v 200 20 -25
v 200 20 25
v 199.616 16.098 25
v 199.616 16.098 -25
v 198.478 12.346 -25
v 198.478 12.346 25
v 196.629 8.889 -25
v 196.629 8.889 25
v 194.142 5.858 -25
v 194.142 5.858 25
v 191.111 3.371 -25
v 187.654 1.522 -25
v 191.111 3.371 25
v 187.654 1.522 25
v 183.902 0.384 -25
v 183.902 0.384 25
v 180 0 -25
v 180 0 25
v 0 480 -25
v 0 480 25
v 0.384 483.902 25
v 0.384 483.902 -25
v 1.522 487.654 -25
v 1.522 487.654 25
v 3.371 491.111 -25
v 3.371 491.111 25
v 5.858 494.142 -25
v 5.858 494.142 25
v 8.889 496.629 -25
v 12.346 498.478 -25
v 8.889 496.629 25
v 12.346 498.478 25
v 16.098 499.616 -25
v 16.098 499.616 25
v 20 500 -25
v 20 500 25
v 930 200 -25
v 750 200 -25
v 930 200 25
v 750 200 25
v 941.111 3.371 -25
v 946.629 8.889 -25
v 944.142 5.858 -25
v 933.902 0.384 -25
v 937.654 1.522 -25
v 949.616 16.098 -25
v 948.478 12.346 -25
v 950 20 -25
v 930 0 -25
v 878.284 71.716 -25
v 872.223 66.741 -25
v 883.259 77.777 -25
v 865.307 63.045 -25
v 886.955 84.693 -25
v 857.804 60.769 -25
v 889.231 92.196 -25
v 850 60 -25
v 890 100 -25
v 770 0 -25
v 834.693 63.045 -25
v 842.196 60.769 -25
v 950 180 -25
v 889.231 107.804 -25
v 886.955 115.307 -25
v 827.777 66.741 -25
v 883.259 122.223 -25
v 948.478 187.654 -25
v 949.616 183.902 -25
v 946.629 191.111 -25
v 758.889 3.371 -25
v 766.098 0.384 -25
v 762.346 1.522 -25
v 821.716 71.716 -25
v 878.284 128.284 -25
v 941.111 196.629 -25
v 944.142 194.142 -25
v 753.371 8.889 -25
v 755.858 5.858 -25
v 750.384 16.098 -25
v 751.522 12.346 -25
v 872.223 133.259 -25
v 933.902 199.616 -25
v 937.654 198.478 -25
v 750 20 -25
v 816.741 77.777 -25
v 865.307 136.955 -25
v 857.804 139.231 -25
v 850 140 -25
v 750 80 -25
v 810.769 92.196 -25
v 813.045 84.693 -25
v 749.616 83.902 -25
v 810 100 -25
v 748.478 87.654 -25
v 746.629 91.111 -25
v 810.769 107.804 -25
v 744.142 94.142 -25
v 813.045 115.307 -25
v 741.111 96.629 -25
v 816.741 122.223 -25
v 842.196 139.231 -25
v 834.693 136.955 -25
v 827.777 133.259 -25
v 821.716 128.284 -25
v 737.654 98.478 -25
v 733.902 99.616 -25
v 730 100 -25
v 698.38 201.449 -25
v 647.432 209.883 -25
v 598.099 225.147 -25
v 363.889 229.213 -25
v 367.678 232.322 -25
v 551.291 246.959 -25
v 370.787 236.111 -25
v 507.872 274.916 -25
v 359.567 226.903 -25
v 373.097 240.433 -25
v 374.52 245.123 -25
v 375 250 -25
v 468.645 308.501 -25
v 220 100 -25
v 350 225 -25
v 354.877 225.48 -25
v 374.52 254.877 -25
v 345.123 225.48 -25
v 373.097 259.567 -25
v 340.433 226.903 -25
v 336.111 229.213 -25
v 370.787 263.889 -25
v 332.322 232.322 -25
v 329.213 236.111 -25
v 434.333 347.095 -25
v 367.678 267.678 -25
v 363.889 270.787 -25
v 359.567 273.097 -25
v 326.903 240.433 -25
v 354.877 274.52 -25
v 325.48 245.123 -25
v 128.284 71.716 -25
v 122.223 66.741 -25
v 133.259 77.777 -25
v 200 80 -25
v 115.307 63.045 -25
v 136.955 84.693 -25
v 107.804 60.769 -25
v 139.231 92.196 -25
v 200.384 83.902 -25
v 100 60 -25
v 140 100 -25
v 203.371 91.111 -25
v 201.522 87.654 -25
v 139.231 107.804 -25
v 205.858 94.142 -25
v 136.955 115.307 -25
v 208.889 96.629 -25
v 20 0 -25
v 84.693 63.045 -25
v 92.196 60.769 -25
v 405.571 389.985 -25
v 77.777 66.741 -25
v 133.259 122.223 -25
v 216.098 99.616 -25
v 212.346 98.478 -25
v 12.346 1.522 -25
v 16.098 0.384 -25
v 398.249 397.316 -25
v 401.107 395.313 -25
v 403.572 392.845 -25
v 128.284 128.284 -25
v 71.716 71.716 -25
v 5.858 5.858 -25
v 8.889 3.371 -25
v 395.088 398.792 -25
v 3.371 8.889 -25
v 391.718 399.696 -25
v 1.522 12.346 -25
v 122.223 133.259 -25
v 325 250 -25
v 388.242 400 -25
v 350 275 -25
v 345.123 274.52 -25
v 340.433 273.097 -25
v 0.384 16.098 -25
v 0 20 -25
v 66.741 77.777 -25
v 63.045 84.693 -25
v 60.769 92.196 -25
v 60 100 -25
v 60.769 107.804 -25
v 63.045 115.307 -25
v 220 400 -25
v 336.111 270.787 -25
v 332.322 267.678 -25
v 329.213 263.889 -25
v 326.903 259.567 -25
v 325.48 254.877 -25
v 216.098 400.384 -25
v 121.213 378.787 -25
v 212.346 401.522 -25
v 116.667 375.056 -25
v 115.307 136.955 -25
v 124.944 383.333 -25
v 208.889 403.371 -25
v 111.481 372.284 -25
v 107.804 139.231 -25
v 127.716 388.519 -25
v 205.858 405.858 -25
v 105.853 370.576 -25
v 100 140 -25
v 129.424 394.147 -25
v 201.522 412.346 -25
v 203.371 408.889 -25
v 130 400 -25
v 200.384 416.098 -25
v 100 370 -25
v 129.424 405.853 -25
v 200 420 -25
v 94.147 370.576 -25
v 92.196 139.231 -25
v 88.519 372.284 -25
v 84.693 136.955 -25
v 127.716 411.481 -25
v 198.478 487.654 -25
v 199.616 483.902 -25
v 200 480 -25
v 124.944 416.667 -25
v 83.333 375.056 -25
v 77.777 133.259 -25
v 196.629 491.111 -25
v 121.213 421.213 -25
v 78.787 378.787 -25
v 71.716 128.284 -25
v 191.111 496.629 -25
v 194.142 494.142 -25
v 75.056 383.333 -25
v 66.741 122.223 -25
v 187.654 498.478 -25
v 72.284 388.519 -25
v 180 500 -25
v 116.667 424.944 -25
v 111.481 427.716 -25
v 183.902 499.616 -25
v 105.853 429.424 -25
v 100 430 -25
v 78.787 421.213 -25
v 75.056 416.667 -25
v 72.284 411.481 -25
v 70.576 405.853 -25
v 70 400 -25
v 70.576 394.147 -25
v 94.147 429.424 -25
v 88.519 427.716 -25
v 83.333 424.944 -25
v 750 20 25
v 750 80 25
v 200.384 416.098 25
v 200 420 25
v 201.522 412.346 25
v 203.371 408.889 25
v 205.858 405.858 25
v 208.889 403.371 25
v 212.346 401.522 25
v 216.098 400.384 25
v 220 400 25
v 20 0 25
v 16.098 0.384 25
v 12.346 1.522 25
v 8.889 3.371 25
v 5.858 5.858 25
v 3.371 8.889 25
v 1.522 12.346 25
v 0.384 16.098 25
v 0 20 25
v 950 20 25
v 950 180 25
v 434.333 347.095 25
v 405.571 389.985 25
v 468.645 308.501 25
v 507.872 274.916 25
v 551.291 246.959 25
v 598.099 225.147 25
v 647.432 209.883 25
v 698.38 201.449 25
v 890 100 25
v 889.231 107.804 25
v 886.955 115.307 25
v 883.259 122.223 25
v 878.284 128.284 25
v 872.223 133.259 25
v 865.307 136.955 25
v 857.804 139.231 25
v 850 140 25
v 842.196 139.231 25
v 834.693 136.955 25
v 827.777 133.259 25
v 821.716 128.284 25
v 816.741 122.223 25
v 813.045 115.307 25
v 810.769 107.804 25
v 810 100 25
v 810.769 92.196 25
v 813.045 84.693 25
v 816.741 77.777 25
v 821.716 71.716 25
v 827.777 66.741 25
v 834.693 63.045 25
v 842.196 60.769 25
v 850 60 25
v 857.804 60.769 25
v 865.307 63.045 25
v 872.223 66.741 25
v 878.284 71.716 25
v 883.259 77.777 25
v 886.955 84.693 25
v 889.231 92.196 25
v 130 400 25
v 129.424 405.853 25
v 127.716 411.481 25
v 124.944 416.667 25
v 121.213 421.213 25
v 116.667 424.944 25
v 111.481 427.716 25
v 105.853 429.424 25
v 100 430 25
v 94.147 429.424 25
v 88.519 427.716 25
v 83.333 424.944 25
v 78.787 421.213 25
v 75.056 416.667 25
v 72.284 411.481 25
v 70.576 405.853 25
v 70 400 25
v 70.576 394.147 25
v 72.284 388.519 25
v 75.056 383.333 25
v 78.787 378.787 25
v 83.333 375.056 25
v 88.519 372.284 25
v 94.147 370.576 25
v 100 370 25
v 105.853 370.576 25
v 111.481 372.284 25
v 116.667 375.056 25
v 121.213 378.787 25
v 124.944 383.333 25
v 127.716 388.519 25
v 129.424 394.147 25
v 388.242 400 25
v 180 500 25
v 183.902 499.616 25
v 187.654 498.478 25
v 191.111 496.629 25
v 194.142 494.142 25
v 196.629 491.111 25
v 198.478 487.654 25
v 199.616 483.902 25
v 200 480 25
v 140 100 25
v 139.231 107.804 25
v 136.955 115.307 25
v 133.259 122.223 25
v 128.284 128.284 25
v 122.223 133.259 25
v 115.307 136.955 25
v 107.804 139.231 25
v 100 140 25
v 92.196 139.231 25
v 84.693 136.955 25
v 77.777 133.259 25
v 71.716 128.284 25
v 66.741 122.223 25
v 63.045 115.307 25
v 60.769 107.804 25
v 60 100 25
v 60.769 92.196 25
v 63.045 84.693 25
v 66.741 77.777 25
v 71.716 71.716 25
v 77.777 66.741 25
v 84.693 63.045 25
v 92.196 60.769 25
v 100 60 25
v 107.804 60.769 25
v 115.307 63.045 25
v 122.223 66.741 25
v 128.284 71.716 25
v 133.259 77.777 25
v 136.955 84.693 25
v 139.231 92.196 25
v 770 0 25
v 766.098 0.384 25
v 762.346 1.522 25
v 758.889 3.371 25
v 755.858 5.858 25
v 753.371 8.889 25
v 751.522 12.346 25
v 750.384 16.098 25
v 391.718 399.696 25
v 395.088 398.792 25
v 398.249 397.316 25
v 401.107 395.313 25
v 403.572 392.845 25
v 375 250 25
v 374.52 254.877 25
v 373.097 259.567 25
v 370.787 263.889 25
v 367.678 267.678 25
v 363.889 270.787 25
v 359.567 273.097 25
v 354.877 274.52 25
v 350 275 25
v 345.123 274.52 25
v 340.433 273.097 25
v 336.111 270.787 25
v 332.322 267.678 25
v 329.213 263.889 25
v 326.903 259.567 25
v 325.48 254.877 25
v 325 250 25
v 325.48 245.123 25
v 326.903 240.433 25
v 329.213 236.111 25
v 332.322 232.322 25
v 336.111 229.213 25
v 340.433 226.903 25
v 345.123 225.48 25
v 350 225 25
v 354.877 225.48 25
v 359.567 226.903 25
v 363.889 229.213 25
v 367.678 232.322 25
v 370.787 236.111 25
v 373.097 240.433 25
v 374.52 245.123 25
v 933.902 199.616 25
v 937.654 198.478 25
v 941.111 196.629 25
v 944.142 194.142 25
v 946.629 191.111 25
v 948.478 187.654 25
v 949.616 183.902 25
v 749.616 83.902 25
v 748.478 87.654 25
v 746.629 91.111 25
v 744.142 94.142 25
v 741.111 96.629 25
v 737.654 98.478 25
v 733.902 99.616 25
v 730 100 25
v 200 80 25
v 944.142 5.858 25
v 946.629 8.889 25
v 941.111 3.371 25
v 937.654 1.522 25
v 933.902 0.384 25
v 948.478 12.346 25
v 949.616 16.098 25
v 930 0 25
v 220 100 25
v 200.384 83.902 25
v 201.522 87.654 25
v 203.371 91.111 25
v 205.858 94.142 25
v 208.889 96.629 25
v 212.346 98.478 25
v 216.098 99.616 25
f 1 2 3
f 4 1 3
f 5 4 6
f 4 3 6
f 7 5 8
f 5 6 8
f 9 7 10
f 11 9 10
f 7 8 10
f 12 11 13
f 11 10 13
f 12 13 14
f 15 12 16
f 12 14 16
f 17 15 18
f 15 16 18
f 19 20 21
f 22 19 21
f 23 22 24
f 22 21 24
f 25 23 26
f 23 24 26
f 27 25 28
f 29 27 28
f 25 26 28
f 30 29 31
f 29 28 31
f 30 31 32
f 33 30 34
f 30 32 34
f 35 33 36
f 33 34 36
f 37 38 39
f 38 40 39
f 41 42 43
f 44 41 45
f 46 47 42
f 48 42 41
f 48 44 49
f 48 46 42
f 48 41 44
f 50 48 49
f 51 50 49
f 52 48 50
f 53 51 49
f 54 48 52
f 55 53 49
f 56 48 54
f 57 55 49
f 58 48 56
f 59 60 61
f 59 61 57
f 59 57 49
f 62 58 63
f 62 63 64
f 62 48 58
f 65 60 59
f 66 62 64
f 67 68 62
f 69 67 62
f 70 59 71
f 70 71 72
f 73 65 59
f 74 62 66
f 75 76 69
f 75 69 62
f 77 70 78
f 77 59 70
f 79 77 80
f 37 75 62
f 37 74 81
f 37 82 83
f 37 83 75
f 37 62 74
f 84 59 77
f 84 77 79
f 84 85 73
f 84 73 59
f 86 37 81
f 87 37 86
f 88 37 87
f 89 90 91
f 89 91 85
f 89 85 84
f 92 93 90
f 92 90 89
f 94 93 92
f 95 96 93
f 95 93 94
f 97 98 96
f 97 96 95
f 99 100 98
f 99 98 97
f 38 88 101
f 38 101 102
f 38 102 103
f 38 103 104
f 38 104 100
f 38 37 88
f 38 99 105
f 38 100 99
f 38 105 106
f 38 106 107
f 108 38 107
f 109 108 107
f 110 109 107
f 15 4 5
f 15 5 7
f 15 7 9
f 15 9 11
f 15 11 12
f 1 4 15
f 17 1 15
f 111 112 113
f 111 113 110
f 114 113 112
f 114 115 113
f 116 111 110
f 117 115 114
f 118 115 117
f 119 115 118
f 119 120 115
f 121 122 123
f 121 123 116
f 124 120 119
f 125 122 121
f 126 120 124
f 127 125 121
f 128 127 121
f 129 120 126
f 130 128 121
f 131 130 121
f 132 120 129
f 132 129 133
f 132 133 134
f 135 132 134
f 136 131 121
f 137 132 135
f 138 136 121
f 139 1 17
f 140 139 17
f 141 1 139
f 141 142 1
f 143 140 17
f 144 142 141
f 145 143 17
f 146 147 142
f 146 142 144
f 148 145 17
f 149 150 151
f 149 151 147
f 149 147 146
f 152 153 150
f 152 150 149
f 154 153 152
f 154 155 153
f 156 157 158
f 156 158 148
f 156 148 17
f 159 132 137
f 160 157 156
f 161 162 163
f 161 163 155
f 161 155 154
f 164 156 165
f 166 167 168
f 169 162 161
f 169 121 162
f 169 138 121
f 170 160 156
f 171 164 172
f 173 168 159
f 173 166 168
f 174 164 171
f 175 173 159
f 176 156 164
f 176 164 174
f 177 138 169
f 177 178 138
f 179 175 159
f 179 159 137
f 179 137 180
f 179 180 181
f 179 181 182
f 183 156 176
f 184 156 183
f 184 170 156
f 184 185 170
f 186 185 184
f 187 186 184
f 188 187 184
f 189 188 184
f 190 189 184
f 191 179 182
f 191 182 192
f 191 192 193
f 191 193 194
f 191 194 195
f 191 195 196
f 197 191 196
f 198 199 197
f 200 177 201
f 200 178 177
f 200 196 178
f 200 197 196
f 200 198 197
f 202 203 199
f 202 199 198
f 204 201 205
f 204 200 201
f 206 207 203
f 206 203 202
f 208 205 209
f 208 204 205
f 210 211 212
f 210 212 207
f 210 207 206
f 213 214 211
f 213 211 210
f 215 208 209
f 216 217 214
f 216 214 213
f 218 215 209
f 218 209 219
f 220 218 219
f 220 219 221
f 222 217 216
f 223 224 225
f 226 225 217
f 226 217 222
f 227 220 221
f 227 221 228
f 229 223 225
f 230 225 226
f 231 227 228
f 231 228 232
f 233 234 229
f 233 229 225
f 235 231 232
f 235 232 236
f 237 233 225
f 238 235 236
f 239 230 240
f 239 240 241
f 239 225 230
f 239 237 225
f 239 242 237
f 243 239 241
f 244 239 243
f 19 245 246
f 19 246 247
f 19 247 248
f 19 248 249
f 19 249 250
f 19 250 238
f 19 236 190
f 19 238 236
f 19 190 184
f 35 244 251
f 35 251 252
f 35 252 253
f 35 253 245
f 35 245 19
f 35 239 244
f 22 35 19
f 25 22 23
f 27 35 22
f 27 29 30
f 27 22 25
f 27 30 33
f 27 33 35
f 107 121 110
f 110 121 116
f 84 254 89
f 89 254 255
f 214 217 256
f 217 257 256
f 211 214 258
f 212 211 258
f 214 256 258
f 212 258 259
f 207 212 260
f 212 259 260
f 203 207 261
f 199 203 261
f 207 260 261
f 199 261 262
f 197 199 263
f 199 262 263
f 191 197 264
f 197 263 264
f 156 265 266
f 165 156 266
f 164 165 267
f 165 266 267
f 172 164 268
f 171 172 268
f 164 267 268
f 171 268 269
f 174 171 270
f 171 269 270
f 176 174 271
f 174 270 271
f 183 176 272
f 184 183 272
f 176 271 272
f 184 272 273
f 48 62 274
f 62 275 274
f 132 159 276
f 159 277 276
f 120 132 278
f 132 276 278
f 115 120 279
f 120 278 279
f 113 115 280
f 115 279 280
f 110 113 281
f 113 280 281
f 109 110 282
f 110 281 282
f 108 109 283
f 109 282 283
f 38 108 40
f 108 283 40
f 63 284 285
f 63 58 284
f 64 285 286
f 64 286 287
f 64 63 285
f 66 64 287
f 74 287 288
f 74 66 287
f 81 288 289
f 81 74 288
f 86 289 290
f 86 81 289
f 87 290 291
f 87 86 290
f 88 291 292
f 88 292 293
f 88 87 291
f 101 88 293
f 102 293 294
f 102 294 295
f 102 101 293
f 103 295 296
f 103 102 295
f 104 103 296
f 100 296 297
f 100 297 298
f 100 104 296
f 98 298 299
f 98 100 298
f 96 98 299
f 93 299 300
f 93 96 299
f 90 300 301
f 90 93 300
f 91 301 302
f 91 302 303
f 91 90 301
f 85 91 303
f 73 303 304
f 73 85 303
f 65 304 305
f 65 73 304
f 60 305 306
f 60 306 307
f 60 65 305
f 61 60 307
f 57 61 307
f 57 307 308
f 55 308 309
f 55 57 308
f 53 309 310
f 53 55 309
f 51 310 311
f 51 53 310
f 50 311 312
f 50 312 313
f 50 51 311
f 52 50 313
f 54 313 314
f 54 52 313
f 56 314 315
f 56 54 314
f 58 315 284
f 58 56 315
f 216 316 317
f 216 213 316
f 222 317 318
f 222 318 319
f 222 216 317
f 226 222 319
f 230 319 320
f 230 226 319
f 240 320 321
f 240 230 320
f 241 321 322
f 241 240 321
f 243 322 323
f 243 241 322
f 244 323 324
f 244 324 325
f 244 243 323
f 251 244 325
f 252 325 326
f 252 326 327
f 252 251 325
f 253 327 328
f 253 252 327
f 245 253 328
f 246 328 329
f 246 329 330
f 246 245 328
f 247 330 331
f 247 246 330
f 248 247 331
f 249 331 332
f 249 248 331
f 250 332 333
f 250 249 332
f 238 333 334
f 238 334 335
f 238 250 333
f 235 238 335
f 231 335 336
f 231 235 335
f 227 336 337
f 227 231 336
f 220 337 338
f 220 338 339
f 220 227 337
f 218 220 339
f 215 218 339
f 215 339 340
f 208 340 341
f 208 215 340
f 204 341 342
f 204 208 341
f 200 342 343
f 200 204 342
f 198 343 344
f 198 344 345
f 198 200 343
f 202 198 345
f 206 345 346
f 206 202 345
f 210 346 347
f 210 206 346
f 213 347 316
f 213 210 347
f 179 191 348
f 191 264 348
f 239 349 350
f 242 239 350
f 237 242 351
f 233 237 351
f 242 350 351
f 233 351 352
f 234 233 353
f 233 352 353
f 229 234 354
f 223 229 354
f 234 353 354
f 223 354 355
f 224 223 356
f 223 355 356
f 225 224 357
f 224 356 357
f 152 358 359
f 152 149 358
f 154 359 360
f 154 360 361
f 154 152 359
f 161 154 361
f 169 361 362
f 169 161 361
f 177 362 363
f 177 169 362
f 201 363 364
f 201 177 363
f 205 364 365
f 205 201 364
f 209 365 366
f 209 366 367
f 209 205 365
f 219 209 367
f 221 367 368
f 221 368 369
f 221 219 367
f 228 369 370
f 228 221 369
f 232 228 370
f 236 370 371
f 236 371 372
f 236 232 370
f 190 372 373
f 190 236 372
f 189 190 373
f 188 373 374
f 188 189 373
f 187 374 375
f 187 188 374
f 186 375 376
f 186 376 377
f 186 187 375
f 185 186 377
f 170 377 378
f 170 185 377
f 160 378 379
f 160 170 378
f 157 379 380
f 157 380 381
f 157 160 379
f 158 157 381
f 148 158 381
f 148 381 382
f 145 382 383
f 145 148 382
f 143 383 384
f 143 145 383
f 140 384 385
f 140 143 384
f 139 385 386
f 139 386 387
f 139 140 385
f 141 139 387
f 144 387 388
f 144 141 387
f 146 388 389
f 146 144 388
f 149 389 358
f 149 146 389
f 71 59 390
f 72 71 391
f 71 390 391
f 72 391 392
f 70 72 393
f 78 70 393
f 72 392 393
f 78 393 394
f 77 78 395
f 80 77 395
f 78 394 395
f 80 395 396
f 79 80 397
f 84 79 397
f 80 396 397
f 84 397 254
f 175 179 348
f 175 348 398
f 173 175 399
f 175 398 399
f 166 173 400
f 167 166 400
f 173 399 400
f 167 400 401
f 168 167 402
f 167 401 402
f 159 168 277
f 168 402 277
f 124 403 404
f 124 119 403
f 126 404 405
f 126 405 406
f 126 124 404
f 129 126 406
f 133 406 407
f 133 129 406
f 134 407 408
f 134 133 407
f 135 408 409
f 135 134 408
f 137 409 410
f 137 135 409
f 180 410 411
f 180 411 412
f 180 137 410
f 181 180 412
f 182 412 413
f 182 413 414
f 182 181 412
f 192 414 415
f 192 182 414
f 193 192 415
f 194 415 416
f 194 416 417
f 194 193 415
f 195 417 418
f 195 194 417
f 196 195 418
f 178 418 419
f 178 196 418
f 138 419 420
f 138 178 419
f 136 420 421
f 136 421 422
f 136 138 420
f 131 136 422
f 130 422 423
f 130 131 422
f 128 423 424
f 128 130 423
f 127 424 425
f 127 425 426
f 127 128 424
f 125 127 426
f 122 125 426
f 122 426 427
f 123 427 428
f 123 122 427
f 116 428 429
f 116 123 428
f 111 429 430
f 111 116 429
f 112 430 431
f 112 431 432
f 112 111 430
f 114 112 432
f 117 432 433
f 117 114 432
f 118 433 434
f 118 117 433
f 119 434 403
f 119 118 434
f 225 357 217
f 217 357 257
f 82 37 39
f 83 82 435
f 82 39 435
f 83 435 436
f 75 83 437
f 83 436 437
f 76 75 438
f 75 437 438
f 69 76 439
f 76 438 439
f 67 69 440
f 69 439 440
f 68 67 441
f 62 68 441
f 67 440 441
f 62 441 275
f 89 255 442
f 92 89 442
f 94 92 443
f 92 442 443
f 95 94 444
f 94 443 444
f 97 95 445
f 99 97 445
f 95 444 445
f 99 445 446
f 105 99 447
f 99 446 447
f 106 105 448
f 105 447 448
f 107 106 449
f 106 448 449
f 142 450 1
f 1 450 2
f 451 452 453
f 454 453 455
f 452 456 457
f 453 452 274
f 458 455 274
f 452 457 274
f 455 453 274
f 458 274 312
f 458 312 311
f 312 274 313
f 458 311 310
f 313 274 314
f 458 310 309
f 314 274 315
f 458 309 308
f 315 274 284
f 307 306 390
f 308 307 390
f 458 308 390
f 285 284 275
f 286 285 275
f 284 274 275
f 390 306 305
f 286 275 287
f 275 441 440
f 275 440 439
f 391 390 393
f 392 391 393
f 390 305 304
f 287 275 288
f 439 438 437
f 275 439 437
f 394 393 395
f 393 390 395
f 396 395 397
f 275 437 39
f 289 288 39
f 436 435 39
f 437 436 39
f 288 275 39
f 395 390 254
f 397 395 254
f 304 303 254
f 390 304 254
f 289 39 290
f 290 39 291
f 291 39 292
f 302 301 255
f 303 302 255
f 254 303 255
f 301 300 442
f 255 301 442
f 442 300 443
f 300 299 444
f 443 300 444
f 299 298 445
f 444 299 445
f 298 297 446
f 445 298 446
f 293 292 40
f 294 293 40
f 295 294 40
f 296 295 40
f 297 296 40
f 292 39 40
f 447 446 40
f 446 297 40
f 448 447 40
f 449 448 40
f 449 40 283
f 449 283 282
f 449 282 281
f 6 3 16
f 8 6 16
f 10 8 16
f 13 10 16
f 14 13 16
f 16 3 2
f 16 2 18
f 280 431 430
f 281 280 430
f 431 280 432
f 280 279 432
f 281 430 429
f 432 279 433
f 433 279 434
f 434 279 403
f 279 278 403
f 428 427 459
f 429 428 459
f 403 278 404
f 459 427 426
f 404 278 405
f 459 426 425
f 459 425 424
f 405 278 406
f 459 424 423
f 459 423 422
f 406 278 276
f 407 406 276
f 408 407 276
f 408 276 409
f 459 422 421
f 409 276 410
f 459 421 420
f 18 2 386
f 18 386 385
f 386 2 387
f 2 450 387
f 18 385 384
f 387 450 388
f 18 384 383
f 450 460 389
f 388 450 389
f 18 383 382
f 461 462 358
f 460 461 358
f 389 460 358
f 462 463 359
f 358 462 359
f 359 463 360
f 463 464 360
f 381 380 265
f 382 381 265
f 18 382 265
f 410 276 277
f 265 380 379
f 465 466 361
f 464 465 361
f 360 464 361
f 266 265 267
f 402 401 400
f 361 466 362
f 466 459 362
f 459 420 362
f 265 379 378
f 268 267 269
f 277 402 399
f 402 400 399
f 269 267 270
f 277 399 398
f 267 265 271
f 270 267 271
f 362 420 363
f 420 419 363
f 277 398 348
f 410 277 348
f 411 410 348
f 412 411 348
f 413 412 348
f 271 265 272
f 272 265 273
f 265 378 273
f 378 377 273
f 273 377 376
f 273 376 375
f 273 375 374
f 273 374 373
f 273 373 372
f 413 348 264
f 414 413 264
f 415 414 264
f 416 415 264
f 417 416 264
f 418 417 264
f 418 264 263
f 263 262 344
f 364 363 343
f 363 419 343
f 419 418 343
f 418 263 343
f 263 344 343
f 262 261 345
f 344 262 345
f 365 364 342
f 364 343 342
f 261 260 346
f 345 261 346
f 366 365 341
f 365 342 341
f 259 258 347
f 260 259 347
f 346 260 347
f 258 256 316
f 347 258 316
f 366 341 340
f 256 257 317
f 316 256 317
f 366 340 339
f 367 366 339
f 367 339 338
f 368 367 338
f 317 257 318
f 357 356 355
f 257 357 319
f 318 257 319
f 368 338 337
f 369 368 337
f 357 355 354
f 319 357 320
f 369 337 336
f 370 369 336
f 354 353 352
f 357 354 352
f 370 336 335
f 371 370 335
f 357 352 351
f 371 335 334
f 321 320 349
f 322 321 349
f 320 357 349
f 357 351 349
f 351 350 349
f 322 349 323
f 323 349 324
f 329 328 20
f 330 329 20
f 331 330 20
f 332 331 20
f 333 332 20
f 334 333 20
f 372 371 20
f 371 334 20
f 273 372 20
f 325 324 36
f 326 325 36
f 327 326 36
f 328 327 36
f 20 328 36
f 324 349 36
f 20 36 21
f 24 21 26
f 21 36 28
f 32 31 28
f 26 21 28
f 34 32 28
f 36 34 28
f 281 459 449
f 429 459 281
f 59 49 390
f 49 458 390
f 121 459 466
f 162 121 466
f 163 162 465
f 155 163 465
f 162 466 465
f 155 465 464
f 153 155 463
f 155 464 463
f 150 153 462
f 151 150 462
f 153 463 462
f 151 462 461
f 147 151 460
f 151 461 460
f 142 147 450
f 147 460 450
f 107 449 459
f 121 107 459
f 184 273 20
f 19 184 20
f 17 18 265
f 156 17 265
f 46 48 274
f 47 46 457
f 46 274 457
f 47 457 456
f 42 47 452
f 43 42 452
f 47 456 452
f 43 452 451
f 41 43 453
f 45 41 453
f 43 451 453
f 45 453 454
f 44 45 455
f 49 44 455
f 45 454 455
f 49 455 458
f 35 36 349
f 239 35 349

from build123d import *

# Parameters (mm, degrees)
SKETCH1_R           = 30
SKETCH1_R_2         = 40
SKETCH1_R_3         = 25
BOSS_EXTRUDE1_DEPTH = 25


with BuildPart() as part:
    # Sketch1 → Boss-Extrude1 (new body, symmetric)
    with BuildSketch(Plane.XY):
        with BuildLine():
            Line((200, 480), (200, 420))
            ThreePointArc((200, 420), (205.857864376, 405.857864376), (220, 400))
            Line((220, 400), (388.241879306, 400))
            ThreePointArc((388.241879306, 400), (398.249452654, 397.316133393), (405.571126809, 389.984847569))
            ThreePointArc((405.571126809, 389.984847569), (551.290675458, 246.959096298), (750, 200))
            Line((750, 200), (930, 200))
            ThreePointArc((930, 200), (944.142135624, 194.142135624), (950, 180))
            Line((950, 180), (950, 20))
            ThreePointArc((950, 20), (944.142135624, 5.857864376), (930, 0))
            Line((930, 0), (770, 0))
            ThreePointArc((770, 0), (755.857864376, 5.857864376), (750, 20))
            Line((750, 20), (750, 80))
            ThreePointArc((750, 80), (744.142135624, 94.142135624), (730, 100))
            Line((730, 100), (220, 100))
            ThreePointArc((220, 100), (205.857864376, 94.142135624), (200, 80))
            Line((200, 80), (200, 20))
            ThreePointArc((200, 20), (194.142135624, 5.857864376), (180, 0))
            Line((180, 0), (20, 0))
            ThreePointArc((20, 0), (5.857864376, 5.857864376), (0, 20))
            Line((0, 20), (0, 480))
            ThreePointArc((0, 480), (5.857864376, 494.142135624), (20, 500))
            Line((20, 500), (180, 500))
            ThreePointArc((180, 500), (194.142135624, 494.142135624), (200, 480))
        make_face()
        with Locations((100, 400)):
            Circle(SKETCH1_R, mode=Mode.SUBTRACT)
        with Locations((100, 100)):
            Circle(SKETCH1_R_2, mode=Mode.SUBTRACT)
        with Locations((350, 250)):
            Circle(SKETCH1_R_3, mode=Mode.SUBTRACT)
        with Locations((850, 100)):
            Circle(SKETCH1_R_2, mode=Mode.SUBTRACT)
    extrude(amount=BOSS_EXTRUDE1_DEPTH, both=True)


solid = part.part
